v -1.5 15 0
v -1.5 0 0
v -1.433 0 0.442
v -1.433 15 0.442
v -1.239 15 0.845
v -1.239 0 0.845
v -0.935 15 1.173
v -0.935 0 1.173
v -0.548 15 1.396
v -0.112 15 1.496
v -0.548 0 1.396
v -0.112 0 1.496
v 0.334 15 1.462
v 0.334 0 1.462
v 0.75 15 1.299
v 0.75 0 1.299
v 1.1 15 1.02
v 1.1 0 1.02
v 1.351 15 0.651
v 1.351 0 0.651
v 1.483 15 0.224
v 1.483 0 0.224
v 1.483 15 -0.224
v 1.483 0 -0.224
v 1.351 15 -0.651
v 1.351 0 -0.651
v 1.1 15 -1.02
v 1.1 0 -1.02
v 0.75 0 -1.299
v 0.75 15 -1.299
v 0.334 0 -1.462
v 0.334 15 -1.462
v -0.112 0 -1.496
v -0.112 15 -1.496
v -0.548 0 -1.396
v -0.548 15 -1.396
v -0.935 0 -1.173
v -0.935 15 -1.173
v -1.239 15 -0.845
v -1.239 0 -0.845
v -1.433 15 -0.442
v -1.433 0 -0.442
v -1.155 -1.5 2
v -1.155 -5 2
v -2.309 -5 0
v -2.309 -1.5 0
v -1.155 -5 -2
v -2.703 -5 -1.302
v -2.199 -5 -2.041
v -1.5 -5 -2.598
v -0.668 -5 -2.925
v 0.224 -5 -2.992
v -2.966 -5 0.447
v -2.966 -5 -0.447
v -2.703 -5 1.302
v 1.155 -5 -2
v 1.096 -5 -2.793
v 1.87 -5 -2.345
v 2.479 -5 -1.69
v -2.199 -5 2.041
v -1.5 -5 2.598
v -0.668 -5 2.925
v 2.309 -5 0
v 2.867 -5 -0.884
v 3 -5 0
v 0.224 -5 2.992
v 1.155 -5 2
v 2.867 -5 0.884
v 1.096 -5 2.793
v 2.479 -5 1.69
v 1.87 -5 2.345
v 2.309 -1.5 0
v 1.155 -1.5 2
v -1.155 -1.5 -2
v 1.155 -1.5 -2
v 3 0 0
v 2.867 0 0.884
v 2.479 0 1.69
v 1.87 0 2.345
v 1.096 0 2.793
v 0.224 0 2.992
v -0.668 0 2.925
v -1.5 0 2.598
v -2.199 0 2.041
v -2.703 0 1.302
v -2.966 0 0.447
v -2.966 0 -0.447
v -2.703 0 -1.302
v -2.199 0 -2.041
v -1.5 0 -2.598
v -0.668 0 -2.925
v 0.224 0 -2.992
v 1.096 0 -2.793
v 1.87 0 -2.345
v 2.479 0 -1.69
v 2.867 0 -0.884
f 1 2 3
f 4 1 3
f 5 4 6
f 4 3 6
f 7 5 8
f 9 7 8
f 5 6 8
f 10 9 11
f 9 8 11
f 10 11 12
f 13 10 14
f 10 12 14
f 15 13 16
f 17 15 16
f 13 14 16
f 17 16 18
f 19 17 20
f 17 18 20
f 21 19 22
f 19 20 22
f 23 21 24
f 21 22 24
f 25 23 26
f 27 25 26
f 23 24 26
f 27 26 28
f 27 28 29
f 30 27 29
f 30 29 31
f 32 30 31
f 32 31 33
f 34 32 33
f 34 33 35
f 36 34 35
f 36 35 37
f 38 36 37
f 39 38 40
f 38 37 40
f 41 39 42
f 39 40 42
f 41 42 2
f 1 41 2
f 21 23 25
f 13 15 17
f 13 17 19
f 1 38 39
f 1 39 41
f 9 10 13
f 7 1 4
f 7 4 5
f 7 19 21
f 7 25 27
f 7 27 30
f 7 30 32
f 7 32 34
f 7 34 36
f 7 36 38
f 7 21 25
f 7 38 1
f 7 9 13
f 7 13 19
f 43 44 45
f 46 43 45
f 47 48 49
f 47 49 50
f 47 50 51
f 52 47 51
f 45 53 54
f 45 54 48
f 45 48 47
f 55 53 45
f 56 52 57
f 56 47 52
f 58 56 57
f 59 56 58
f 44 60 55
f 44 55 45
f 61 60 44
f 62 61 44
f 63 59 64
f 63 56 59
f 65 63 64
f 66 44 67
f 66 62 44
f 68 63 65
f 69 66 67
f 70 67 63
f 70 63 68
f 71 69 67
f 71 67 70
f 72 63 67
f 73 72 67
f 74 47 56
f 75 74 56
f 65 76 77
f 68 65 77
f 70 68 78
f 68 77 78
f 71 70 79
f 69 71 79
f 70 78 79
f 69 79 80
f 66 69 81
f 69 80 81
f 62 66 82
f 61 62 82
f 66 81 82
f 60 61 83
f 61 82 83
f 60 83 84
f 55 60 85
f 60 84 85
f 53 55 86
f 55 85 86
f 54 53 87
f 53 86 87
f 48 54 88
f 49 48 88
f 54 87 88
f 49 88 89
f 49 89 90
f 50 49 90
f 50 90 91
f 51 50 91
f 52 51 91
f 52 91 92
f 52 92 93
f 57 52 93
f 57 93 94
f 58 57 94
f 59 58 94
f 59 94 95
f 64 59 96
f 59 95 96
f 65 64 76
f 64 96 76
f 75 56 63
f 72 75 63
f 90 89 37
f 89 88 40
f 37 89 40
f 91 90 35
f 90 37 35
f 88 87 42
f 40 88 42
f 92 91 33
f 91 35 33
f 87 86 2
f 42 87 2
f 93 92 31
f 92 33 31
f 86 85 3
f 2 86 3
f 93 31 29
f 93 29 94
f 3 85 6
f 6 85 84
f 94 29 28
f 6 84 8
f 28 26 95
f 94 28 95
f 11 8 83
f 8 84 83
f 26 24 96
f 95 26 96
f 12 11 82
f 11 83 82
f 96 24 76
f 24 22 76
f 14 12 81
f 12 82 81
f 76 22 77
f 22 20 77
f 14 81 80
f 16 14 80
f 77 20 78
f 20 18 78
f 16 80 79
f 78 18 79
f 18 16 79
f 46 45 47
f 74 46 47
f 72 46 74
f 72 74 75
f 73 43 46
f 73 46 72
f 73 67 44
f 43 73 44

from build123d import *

# Parameters (mm, degrees)
F0_R     = 3
F1_DEPTH = 5
F3_DEPTH = 3.5
F4_R     = 1.5
F5_DEPTH = 15


with BuildPart() as f1:
    # F0 (on Front) → F1 (new body)
    with BuildSketch(Plane.XZ):
        Circle(F0_R)
    extrude(amount=F1_DEPTH)

    # F2 (on face) → F3 (cut)
    with BuildSketch(Plane.XZ.offset(5)):
        Polygon((1.154701, 2), (-1.154701, 2), (-2.309401, 0), (-1.154701, -2), (1.154701, -2), (2.309401, 0), align=None)
    extrude(amount=-F3_DEPTH, mode=Mode.SUBTRACT)

    # F4 (on face) → F5 (join)
    with BuildSketch(Plane(origin=(0, 0, 0), x_dir=(-1, 0, 0), z_dir=(0, 1, 0))):
        Circle(F4_R)
    extrude(amount=F5_DEPTH)


solid = f1.part
